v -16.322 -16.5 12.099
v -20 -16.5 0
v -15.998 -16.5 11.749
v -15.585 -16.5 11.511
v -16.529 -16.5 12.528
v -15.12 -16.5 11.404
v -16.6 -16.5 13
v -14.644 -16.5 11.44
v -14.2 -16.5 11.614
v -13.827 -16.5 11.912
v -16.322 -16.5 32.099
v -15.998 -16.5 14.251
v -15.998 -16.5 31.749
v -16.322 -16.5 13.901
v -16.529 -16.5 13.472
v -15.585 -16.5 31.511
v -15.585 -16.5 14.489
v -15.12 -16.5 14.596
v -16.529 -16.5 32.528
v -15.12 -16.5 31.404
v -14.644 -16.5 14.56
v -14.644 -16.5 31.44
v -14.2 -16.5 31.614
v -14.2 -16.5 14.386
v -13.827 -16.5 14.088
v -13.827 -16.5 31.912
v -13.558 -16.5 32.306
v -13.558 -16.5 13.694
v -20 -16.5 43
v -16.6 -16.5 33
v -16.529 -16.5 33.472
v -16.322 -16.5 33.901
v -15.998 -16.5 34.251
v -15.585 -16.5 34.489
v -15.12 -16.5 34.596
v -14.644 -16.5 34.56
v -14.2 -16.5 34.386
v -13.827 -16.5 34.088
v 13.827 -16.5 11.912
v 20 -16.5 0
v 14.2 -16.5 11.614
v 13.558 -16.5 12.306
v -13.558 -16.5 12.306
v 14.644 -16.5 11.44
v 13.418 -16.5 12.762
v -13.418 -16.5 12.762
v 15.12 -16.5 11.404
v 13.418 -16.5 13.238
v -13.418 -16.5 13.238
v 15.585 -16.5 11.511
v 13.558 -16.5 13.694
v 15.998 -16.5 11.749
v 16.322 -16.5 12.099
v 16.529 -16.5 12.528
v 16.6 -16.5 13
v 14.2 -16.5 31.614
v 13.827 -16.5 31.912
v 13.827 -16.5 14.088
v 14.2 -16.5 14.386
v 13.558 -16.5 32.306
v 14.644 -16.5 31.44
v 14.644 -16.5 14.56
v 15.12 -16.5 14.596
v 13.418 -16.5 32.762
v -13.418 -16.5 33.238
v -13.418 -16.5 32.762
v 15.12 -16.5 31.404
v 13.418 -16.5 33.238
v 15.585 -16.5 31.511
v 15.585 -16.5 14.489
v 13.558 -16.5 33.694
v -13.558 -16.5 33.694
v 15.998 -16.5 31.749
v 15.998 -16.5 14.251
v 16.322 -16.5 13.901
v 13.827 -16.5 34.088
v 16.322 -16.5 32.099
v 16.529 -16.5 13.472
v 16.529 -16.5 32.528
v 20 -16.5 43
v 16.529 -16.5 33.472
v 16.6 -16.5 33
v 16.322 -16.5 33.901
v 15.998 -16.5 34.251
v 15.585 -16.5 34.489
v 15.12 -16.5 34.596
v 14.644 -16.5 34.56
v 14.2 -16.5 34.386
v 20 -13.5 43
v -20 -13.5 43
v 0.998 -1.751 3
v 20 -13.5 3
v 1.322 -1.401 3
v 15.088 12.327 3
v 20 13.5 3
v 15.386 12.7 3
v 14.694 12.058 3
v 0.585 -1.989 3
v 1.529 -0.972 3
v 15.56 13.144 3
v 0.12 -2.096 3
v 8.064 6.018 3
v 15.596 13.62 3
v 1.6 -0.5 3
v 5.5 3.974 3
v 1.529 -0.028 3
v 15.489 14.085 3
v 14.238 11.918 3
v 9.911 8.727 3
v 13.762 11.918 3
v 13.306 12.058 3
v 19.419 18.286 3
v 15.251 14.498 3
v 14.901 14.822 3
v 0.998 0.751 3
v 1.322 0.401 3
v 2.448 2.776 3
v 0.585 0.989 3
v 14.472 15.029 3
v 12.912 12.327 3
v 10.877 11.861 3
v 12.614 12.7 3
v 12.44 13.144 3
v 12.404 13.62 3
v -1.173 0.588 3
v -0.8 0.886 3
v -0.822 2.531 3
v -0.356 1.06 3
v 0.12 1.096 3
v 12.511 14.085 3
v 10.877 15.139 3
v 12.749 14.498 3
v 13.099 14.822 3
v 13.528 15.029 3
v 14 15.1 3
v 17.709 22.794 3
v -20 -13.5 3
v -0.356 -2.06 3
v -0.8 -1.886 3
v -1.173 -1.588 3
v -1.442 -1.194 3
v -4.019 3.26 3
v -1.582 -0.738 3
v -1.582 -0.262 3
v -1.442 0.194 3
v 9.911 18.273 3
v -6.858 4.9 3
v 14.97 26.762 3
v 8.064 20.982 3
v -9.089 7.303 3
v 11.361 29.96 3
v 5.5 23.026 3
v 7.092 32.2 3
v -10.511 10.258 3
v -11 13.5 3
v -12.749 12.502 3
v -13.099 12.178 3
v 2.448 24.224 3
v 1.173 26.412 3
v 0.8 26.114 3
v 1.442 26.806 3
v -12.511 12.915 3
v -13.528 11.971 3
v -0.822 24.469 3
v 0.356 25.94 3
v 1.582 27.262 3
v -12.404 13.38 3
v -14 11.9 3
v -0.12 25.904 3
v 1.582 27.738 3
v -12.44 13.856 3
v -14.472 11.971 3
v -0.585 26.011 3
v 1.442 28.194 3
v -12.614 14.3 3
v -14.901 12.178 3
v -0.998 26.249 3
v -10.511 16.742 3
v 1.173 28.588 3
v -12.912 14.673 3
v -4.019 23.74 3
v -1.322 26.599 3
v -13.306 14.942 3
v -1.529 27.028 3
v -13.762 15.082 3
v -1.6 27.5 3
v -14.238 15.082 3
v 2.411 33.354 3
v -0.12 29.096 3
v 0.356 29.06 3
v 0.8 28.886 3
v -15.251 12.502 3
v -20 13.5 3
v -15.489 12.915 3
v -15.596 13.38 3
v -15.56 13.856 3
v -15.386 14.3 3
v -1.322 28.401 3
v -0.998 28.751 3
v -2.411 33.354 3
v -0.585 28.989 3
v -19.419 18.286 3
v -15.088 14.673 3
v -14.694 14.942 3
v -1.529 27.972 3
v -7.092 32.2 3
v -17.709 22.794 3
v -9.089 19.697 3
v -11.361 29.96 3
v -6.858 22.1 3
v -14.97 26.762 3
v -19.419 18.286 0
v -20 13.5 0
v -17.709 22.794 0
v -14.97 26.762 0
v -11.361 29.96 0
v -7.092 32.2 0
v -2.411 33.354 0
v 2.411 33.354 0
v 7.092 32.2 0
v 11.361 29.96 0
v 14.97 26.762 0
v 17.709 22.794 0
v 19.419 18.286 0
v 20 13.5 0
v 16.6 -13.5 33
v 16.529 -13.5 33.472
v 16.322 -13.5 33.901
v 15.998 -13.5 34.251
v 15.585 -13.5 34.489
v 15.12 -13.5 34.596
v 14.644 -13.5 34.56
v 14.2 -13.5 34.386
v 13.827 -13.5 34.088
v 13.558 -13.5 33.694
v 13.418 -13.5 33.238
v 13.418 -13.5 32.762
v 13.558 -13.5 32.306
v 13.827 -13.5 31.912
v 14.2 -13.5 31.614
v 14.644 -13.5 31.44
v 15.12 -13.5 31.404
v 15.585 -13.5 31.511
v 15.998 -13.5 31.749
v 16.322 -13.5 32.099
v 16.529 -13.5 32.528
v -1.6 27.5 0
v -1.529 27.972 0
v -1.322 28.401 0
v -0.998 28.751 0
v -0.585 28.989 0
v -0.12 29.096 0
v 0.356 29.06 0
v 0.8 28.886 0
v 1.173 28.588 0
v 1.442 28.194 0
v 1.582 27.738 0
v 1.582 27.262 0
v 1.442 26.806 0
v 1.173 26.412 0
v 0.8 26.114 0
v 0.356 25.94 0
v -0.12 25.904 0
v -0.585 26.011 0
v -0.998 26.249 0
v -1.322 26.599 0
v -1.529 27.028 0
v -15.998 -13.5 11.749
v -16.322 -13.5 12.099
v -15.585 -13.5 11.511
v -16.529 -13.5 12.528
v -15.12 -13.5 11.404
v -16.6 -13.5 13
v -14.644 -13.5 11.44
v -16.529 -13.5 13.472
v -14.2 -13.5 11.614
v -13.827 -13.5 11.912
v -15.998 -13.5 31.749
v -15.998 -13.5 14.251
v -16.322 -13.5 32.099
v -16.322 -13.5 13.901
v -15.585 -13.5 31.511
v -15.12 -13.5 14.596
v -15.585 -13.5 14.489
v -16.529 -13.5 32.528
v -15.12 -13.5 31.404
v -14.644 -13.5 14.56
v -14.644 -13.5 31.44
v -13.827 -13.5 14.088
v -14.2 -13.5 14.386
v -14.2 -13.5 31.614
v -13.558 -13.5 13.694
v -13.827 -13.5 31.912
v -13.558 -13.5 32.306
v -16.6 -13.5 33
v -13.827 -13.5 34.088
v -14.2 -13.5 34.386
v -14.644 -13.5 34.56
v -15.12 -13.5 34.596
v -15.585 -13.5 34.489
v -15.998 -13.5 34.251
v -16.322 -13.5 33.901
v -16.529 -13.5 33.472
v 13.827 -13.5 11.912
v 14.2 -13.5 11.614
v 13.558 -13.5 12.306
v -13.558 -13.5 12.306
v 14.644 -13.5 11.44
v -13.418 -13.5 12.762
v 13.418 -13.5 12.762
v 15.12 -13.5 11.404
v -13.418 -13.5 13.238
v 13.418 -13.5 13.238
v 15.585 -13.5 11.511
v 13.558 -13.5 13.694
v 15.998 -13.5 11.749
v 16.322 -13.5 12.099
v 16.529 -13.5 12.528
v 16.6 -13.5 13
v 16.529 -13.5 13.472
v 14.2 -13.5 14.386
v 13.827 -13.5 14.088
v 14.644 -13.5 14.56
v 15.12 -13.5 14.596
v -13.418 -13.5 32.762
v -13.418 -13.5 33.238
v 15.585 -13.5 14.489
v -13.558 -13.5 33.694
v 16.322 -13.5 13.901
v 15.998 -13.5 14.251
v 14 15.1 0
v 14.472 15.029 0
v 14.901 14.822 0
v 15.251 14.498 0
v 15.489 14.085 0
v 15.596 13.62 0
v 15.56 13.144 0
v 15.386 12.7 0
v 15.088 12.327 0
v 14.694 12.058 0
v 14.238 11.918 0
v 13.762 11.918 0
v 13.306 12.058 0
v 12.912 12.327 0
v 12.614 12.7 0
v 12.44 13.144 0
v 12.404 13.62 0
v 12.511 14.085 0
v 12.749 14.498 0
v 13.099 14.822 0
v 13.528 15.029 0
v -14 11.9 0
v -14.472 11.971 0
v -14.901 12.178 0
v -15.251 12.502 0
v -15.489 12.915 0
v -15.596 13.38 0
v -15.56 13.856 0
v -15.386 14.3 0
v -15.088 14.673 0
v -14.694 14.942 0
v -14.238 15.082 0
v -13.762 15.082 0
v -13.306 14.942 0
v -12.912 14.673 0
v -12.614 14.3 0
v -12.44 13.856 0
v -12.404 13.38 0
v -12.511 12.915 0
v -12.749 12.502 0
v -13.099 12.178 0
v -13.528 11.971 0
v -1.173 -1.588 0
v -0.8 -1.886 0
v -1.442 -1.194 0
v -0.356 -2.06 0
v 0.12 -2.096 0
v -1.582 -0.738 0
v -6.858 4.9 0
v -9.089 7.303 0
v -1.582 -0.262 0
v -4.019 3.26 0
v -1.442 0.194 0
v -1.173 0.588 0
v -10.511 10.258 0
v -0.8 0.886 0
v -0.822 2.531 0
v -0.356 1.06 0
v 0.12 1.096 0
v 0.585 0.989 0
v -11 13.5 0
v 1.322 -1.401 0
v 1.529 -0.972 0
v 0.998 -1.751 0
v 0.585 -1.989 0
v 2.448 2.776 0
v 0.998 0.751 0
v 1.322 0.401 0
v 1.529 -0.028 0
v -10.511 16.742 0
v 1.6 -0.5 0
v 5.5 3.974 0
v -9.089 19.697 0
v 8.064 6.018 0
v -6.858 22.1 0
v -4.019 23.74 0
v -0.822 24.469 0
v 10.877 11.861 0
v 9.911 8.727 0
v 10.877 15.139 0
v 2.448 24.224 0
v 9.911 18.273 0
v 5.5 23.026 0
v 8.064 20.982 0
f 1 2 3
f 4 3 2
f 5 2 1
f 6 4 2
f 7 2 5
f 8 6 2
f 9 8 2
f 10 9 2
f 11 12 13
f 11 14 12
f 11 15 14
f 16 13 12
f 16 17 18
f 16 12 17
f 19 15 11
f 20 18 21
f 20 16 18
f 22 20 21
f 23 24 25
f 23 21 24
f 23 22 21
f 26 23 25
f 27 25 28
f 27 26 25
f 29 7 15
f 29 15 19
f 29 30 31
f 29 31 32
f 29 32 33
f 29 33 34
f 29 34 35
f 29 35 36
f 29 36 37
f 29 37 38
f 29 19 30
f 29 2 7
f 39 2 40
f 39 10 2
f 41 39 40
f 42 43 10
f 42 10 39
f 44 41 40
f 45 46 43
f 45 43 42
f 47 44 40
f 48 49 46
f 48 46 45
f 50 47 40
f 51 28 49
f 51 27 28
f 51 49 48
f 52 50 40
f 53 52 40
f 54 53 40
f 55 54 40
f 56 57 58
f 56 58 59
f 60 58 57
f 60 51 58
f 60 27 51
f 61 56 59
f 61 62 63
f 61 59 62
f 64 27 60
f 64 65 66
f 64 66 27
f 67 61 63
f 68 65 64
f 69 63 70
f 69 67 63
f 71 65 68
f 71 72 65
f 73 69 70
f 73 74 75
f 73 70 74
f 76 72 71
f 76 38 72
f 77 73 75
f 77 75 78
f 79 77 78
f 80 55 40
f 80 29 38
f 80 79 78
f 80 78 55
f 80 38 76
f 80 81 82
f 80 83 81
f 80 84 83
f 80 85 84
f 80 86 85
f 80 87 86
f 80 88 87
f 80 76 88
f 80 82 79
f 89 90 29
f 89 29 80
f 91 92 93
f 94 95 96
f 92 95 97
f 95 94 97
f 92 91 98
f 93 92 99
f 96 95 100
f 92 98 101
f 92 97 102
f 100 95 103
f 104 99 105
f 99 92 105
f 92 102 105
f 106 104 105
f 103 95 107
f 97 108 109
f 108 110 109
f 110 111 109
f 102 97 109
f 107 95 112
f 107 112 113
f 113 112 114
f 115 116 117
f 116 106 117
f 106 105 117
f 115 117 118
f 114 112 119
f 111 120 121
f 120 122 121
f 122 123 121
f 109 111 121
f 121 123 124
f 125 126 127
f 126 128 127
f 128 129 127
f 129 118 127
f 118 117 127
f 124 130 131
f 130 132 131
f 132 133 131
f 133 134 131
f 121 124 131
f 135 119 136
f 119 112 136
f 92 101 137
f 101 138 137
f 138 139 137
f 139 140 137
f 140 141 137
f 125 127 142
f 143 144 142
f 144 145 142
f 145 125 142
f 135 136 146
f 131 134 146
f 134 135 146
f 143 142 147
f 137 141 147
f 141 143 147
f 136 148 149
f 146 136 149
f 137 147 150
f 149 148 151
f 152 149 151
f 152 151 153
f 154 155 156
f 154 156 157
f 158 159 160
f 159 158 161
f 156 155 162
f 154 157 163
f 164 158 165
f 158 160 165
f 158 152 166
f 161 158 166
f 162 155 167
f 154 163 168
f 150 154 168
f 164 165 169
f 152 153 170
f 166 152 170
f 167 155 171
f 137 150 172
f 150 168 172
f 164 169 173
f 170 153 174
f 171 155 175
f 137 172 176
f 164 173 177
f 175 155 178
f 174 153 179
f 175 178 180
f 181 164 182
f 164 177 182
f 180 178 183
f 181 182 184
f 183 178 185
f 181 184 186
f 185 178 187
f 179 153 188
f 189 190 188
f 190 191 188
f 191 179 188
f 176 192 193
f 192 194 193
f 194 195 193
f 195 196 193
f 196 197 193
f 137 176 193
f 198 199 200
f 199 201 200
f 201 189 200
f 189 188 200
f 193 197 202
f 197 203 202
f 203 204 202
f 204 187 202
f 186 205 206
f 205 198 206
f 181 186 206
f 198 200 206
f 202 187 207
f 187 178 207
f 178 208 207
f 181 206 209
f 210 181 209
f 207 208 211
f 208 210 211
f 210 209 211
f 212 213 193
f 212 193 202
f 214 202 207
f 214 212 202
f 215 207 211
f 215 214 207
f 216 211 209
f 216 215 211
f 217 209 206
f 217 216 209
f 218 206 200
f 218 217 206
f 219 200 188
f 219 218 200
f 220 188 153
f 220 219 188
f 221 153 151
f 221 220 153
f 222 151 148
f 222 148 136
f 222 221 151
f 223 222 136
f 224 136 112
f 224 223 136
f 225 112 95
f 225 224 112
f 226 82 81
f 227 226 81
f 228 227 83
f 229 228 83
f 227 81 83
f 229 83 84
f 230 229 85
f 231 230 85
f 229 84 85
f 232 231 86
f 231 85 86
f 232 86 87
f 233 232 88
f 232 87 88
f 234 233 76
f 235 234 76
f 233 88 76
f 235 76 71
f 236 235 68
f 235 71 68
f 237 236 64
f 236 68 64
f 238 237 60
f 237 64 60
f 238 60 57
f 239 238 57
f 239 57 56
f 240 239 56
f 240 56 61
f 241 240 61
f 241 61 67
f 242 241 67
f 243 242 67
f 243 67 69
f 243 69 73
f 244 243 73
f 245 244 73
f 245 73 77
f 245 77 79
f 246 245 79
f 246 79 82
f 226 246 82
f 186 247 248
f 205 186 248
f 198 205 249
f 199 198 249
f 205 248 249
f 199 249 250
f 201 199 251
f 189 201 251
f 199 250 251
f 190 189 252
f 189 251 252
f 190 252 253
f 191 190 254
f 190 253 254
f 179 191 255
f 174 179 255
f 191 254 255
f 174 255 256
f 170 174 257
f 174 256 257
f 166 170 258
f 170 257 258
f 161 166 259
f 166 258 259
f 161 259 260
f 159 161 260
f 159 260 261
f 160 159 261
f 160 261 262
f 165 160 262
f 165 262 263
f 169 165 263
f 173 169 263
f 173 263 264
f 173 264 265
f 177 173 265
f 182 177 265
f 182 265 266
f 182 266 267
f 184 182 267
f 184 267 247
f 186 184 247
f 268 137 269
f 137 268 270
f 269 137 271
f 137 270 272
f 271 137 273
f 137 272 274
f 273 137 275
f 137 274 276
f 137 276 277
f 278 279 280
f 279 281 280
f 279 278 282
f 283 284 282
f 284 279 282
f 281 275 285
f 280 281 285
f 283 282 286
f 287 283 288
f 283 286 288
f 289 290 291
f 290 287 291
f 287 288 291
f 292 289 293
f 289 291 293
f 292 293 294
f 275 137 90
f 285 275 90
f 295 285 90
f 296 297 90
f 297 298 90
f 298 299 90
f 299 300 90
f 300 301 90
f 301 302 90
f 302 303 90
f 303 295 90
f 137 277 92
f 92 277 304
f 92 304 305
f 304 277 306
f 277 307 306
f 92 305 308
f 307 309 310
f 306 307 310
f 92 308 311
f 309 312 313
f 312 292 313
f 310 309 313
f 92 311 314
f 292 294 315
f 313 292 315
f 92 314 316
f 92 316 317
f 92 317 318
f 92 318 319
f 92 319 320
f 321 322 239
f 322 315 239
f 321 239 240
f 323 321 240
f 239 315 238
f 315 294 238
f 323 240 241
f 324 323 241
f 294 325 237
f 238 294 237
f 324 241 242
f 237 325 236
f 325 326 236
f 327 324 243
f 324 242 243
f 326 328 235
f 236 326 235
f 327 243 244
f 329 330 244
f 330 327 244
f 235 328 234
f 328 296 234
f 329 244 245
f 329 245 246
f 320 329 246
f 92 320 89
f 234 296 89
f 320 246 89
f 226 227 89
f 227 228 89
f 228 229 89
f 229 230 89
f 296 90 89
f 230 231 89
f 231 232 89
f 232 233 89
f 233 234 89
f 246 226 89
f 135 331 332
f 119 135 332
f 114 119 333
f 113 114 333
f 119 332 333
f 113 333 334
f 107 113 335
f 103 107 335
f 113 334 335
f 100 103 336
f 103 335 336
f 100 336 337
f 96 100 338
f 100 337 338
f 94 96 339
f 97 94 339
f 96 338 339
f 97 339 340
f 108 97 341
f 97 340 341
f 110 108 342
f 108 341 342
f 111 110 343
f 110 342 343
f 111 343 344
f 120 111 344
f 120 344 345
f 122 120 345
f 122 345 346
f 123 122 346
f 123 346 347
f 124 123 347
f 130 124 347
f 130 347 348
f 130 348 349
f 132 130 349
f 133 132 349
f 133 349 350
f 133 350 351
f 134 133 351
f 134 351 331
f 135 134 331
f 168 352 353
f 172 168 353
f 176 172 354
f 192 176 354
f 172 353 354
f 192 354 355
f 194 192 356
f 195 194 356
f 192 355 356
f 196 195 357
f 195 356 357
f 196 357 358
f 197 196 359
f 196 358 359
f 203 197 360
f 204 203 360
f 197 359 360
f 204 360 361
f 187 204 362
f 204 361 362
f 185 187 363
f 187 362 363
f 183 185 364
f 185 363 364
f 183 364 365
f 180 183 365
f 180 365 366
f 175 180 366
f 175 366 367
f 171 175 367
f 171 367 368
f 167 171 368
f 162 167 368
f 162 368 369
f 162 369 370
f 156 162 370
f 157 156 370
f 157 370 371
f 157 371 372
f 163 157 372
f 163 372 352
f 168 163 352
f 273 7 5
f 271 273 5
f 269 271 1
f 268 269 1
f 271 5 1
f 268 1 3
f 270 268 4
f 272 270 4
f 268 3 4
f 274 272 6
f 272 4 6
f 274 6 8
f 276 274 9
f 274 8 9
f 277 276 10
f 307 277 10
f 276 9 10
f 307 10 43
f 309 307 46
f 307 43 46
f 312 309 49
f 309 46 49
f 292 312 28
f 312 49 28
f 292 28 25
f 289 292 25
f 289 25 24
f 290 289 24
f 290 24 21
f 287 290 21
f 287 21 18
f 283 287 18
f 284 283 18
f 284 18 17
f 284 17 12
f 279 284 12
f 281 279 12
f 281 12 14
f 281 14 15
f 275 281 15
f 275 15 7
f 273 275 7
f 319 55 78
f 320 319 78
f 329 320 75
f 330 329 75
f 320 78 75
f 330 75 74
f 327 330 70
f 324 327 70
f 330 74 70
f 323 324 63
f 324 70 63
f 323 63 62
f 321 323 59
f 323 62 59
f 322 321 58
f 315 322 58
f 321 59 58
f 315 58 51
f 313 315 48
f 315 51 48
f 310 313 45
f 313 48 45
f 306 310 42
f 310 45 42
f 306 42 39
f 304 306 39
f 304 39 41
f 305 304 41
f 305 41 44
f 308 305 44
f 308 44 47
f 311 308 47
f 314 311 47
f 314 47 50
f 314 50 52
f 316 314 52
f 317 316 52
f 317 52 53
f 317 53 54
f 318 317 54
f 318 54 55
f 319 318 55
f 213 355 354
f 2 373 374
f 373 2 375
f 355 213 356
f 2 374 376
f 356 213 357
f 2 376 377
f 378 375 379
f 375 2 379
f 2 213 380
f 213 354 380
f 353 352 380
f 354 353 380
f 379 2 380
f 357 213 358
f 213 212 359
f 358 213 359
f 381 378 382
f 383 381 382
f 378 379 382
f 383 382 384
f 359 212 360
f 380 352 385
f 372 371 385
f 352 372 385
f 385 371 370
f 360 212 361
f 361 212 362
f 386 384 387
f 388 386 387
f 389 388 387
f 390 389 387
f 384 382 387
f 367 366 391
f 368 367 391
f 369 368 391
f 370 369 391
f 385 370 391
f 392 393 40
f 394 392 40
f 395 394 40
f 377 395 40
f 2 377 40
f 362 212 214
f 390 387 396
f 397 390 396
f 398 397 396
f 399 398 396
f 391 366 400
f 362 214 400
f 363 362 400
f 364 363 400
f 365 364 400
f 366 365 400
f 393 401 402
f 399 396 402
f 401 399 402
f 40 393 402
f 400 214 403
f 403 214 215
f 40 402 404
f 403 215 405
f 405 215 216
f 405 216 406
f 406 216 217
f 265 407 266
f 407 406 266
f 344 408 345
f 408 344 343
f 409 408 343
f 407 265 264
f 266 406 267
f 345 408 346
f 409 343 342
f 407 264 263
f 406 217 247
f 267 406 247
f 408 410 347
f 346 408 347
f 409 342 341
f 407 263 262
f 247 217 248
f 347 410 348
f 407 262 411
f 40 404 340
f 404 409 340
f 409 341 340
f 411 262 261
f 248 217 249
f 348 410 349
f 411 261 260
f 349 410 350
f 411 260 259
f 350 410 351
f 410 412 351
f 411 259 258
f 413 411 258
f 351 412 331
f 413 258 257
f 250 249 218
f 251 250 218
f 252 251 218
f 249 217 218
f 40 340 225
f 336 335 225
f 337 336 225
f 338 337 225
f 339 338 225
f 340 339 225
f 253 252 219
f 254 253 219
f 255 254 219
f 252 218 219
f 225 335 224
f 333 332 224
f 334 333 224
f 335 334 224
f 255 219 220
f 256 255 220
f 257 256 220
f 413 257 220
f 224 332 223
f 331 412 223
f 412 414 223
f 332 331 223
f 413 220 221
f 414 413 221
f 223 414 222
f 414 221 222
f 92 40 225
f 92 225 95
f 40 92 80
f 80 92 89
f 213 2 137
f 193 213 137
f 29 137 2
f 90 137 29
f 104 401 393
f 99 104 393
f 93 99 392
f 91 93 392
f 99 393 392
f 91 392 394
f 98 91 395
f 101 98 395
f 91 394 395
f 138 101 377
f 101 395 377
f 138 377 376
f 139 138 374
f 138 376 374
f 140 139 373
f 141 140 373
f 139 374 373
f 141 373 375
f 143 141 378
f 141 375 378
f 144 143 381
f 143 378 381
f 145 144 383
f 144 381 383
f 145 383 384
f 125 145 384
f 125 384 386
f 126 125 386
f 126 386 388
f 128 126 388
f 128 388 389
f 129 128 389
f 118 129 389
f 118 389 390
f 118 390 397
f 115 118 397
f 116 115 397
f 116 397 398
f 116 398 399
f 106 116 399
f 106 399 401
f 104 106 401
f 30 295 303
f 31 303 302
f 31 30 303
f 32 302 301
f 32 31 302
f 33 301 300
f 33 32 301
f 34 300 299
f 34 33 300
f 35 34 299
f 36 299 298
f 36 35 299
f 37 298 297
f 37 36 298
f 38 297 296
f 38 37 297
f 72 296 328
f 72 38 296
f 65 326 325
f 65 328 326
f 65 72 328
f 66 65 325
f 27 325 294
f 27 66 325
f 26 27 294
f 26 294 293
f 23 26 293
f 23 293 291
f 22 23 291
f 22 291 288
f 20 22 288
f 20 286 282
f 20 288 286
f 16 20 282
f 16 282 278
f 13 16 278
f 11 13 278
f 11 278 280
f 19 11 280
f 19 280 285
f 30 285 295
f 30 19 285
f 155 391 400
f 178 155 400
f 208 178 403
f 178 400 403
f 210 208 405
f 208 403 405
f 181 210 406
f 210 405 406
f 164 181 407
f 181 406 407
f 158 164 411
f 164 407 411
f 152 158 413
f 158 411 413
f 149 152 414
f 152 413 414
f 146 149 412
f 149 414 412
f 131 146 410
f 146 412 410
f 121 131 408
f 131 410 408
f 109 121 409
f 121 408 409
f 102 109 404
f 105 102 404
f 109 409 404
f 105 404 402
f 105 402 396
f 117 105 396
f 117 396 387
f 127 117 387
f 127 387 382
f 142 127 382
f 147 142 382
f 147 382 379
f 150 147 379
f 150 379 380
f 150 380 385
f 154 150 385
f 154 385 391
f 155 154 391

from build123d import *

# Parameters (mm, degrees)
SKETCH_1_W               = 40
SKETCH_1_H               = 27
EXTRUDE_1_DEPTH          = 3
EXTRUDE_2_DEPTH          = 3
SKETCH_3_W               = 40
SKETCH_3_H               = 43
EXTRUDE_3_DEPTH          = 3
SKETCH_5_R               = 11
CUT_EXTRUDE_1_DEPTH      = 59.062466362
SKETCH_6_R               = 1.6
CUT_EXTRUDE_2_DEPTH      = 59.062466362
PATTERN_CIRCULAR_1_COUNT = 4
SKETCH_7_R               = 1.6
CUT_EXTRUDE_3_DEPTH      = 69.912988616
PATTERN_LINEAR_1_COUNT   = 2
PATTERN_LINEAR_1_PITCH   = 20
MIRROR_1_COPY_1_SKETCH_R = 1.6
MIRROR_1_COPY_1_DEPTH    = 69.912988616


with BuildPart() as part:
    # 草图1 → 凸台-拉伸1 (new body)
    with BuildSketch(Plane.XY):
        Rectangle(SKETCH_1_W, SKETCH_1_H)
    extrude(amount=EXTRUDE_1_DEPTH)

    # 草图2 → 凸台-拉伸2 (add)
    with BuildSketch(Plane(origin=(0, 0, 0), x_dir=(-1, 0, 0), z_dir=(0, 0, -1))):
        with BuildLine():
            Line((-20, 13.5), (20, 13.5))
            ThreePointArc((20, 13.5), (0, 33.5), (-20, 13.5))
        make_face()
    extrude(amount=-EXTRUDE_2_DEPTH)

    # 草图3 → 凸台-拉伸3 (add)
    with BuildSketch(Plane.XZ.offset(13.5)):
        with Locations((0, 21.5)):
            Rectangle(SKETCH_3_W, SKETCH_3_H)
    extrude(amount=EXTRUDE_3_DEPTH)

    # 草图5 → 切除-拉伸1 (cut, through all)
    with BuildSketch(Plane(origin=(0, 0, 0), x_dir=(-1, 0, 0), z_dir=(0, 0, -1))):
        with Locations((0, 13.5)):
            Circle(SKETCH_5_R)
    extrude(amount=-CUT_EXTRUDE_1_DEPTH, mode=Mode.SUBTRACT)

    # 草图6 → 切除-拉伸2 (cut, through all)
    with BuildSketch(Plane(origin=(0, 0, 0), x_dir=(-1, 0, 0), z_dir=(0, 0, -1))):
        with Locations((0, 27.5)):
            Circle(SKETCH_6_R)
    cut_extrude_2 = extrude(amount=-CUT_EXTRUDE_2_DEPTH, mode=Mode.SUBTRACT)

    # 阵列(圆周)1: 切除-拉伸2 ×4 about axis
    pattern_circular_1_axis = Axis((0, 13.5, 0), (0, 0, 1))
    for i in range(1, PATTERN_CIRCULAR_1_COUNT):
        add(cut_extrude_2.rotate(pattern_circular_1_axis, i * 360 / PATTERN_CIRCULAR_1_COUNT), mode=Mode.SUBTRACT)

    # 草图7 → 切除-拉伸3 (cut, through all)
    with BuildSketch(Plane.XZ.offset(16.5)):
        with Locations((15, 33)):
            Circle(SKETCH_7_R)
    cut_extrude_3 = extrude(amount=-CUT_EXTRUDE_3_DEPTH, mode=Mode.SUBTRACT)

    # 阵列(线性)1: 切除-拉伸3 ×2
    with Locations(*[(0, 0, -i * PATTERN_LINEAR_1_PITCH) for i in range(1, PATTERN_LINEAR_1_COUNT)]):
        add(cut_extrude_3, mode=Mode.SUBTRACT)

    # 镜向1: 切除-拉伸3 across plane
    add(cut_extrude_3.mirror(Plane(origin=(0, 0, 0), x_dir=(0, 0, 1), z_dir=(1, 0, 0))), mode=Mode.SUBTRACT)

    # 镜向1 copy 1 sketch → 镜向1 copy 1 (cut, through all)
    with BuildSketch(Plane(origin=(0, -16.5, -20), x_dir=(-1, 0, 0), z_dir=(0, -1, 0))):
        with Locations((15, -33)):
            Circle(MIRROR_1_COPY_1_SKETCH_R)
    extrude(amount=-MIRROR_1_COPY_1_DEPTH, mode=Mode.SUBTRACT)


solid = part.part
